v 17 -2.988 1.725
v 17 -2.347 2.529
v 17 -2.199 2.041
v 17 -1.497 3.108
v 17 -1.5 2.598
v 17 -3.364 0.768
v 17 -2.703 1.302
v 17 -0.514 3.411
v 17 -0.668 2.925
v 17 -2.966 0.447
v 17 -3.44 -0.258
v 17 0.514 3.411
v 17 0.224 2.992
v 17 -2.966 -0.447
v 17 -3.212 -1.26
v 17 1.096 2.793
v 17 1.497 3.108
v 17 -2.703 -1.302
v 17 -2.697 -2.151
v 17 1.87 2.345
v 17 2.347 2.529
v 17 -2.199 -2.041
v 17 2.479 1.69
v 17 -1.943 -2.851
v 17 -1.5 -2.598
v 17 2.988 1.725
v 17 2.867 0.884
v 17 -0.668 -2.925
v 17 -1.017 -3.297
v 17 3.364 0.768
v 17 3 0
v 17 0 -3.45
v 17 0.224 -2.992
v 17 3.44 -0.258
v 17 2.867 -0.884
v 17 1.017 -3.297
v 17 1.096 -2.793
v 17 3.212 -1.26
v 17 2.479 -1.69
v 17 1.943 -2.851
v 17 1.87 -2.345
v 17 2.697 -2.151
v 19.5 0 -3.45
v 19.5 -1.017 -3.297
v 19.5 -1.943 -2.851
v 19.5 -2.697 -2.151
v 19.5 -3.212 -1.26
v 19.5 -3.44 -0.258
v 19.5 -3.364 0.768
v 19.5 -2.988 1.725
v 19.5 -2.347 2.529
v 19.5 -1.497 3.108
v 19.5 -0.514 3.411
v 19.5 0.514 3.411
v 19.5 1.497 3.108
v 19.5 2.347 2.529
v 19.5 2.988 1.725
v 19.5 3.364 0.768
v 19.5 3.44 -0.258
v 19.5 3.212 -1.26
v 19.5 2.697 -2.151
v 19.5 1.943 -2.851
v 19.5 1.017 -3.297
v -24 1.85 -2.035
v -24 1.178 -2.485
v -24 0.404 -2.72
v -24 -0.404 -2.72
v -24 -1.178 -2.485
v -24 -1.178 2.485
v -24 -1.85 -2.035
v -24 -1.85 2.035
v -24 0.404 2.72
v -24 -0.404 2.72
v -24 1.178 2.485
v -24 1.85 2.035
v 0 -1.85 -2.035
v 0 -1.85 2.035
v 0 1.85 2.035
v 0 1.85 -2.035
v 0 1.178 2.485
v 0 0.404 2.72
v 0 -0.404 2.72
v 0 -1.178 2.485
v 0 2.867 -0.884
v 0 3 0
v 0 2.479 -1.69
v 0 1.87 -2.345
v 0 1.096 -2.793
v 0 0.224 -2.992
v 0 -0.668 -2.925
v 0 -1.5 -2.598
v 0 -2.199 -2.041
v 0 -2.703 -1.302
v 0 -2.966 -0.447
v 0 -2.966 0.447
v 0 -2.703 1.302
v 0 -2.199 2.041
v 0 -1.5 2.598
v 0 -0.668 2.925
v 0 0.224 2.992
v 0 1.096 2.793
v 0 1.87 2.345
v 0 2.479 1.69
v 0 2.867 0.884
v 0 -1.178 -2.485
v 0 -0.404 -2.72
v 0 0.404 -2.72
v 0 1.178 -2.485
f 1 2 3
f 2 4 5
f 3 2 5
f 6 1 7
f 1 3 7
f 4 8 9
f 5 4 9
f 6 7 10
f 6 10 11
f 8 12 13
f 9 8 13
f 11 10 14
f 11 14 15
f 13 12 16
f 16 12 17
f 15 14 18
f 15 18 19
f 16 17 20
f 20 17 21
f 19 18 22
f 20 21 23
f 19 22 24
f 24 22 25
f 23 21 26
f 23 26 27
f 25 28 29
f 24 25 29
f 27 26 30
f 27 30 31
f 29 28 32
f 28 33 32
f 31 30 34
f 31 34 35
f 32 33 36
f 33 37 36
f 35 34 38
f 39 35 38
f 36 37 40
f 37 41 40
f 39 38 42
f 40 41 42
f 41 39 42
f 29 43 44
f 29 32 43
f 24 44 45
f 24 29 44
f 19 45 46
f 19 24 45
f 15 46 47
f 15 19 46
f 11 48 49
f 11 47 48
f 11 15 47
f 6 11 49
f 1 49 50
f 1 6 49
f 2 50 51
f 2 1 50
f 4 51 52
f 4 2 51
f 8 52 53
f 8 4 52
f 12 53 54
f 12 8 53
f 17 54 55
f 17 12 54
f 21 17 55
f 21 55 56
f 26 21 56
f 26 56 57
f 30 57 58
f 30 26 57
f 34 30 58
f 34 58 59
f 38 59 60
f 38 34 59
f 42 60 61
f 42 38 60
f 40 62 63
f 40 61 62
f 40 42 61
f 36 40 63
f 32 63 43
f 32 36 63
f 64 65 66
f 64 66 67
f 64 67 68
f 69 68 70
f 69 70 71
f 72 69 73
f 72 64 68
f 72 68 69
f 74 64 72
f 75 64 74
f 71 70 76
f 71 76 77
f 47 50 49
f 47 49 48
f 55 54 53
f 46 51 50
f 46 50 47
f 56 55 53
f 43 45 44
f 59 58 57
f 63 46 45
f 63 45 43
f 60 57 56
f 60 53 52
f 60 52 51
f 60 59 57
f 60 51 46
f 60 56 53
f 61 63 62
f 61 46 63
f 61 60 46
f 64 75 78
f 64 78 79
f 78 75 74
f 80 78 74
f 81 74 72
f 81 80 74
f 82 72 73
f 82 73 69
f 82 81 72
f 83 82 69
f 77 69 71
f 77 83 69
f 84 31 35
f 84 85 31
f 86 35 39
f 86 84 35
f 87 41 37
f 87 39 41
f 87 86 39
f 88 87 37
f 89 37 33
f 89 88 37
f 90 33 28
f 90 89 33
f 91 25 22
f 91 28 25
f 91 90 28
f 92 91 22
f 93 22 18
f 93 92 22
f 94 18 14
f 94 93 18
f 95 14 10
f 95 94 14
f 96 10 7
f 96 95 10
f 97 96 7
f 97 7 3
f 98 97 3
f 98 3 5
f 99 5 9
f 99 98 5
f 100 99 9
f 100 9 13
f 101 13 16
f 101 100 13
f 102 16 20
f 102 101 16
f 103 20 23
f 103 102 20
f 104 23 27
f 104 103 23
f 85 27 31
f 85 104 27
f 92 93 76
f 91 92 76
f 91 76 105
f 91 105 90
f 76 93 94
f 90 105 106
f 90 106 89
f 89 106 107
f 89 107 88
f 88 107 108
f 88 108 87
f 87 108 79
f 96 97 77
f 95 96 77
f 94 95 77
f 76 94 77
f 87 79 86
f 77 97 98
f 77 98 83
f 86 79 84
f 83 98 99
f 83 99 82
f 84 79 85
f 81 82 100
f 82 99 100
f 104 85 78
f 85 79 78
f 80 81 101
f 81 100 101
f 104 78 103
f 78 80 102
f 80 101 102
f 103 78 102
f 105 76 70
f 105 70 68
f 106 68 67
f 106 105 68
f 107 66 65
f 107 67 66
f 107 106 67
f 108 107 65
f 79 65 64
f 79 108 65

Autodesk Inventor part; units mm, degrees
ref_plane "YZ Plane" through (0, 0, 0) normal (1, 0, 0) x (0, 1, 0)
ref_plane "XZ Plane" through (0, 0, 0) normal (0, 1, 0) x (-1, 0, 0)
ref_plane "XY Plane" through (0, 0, 0) normal (0, 0, 1) x (1, 0, 0)
sketch "Sketch1" plane through (0, 0, 0) normal (1, 0, 0) x (0, 1, 0)
  circle A0 centre (0, 0) radius 3
  dimension "d0" = 6
extrude "Extrusion1" add sketch "Sketch1" along normal blind 17
sketch "Sketch2" plane through (17, 0, 0) normal (1, 0, 0) x (0, 0, -1)
  circle A0 centre (0, 0) radius 3.45
  dimension "d3" = 6.9
extrude "Extrusion2" add sketch "Sketch2" along normal blind 2.5
sketch "Sketch3" plane through (0, 0, 0) normal (-1, 0, 0) x (0, 0, 1)
  circle A0 centre (0, 0) radius 2.75
  dimension "d6" = 5.5
extrude "Extrusion3" add sketch "Sketch3" along normal blind 24
sketch "Sketch4" plane through (-24, 0, 0) normal (-1, 0, 0) x (0, 0, 1)
  line L0 (0, 0) -> (0, -1.85)
  line L1 (0, 0) -> (0, 1.85)
  line L2 (0, -1.85) -> (-3.7501, -1.85)
  line L3 (-3.7501, -1.85) -> (3.8768, -1.85)
  line L4 (3.8768, -1.85) -> (3.8768, 1.85)
  line L5 (3.8768, 1.85) -> (-3.7501, 1.85)
  line L6 (-3.7501, 1.85) -> (-3.7501, -1.85)
  line L7 (-7.0983, -8.0342) -> (8.0665, -8.0342)
  line L8 (8.0665, -8.0342) -> (8.0665, 8.0154)
  line L9 (8.0665, 8.0154) -> (-7.0983, 8.0154)
  line L10 (-7.0983, 8.0154) -> (-7.0983, -8.0342)
  dimension "d9" = 1.85
  dimension "d10" = 1.85
extrude "Extrusion4" cut sketch "Sketch4" against normal blind 24
properties part number "draaiarm voorwielen_3DPrint"
